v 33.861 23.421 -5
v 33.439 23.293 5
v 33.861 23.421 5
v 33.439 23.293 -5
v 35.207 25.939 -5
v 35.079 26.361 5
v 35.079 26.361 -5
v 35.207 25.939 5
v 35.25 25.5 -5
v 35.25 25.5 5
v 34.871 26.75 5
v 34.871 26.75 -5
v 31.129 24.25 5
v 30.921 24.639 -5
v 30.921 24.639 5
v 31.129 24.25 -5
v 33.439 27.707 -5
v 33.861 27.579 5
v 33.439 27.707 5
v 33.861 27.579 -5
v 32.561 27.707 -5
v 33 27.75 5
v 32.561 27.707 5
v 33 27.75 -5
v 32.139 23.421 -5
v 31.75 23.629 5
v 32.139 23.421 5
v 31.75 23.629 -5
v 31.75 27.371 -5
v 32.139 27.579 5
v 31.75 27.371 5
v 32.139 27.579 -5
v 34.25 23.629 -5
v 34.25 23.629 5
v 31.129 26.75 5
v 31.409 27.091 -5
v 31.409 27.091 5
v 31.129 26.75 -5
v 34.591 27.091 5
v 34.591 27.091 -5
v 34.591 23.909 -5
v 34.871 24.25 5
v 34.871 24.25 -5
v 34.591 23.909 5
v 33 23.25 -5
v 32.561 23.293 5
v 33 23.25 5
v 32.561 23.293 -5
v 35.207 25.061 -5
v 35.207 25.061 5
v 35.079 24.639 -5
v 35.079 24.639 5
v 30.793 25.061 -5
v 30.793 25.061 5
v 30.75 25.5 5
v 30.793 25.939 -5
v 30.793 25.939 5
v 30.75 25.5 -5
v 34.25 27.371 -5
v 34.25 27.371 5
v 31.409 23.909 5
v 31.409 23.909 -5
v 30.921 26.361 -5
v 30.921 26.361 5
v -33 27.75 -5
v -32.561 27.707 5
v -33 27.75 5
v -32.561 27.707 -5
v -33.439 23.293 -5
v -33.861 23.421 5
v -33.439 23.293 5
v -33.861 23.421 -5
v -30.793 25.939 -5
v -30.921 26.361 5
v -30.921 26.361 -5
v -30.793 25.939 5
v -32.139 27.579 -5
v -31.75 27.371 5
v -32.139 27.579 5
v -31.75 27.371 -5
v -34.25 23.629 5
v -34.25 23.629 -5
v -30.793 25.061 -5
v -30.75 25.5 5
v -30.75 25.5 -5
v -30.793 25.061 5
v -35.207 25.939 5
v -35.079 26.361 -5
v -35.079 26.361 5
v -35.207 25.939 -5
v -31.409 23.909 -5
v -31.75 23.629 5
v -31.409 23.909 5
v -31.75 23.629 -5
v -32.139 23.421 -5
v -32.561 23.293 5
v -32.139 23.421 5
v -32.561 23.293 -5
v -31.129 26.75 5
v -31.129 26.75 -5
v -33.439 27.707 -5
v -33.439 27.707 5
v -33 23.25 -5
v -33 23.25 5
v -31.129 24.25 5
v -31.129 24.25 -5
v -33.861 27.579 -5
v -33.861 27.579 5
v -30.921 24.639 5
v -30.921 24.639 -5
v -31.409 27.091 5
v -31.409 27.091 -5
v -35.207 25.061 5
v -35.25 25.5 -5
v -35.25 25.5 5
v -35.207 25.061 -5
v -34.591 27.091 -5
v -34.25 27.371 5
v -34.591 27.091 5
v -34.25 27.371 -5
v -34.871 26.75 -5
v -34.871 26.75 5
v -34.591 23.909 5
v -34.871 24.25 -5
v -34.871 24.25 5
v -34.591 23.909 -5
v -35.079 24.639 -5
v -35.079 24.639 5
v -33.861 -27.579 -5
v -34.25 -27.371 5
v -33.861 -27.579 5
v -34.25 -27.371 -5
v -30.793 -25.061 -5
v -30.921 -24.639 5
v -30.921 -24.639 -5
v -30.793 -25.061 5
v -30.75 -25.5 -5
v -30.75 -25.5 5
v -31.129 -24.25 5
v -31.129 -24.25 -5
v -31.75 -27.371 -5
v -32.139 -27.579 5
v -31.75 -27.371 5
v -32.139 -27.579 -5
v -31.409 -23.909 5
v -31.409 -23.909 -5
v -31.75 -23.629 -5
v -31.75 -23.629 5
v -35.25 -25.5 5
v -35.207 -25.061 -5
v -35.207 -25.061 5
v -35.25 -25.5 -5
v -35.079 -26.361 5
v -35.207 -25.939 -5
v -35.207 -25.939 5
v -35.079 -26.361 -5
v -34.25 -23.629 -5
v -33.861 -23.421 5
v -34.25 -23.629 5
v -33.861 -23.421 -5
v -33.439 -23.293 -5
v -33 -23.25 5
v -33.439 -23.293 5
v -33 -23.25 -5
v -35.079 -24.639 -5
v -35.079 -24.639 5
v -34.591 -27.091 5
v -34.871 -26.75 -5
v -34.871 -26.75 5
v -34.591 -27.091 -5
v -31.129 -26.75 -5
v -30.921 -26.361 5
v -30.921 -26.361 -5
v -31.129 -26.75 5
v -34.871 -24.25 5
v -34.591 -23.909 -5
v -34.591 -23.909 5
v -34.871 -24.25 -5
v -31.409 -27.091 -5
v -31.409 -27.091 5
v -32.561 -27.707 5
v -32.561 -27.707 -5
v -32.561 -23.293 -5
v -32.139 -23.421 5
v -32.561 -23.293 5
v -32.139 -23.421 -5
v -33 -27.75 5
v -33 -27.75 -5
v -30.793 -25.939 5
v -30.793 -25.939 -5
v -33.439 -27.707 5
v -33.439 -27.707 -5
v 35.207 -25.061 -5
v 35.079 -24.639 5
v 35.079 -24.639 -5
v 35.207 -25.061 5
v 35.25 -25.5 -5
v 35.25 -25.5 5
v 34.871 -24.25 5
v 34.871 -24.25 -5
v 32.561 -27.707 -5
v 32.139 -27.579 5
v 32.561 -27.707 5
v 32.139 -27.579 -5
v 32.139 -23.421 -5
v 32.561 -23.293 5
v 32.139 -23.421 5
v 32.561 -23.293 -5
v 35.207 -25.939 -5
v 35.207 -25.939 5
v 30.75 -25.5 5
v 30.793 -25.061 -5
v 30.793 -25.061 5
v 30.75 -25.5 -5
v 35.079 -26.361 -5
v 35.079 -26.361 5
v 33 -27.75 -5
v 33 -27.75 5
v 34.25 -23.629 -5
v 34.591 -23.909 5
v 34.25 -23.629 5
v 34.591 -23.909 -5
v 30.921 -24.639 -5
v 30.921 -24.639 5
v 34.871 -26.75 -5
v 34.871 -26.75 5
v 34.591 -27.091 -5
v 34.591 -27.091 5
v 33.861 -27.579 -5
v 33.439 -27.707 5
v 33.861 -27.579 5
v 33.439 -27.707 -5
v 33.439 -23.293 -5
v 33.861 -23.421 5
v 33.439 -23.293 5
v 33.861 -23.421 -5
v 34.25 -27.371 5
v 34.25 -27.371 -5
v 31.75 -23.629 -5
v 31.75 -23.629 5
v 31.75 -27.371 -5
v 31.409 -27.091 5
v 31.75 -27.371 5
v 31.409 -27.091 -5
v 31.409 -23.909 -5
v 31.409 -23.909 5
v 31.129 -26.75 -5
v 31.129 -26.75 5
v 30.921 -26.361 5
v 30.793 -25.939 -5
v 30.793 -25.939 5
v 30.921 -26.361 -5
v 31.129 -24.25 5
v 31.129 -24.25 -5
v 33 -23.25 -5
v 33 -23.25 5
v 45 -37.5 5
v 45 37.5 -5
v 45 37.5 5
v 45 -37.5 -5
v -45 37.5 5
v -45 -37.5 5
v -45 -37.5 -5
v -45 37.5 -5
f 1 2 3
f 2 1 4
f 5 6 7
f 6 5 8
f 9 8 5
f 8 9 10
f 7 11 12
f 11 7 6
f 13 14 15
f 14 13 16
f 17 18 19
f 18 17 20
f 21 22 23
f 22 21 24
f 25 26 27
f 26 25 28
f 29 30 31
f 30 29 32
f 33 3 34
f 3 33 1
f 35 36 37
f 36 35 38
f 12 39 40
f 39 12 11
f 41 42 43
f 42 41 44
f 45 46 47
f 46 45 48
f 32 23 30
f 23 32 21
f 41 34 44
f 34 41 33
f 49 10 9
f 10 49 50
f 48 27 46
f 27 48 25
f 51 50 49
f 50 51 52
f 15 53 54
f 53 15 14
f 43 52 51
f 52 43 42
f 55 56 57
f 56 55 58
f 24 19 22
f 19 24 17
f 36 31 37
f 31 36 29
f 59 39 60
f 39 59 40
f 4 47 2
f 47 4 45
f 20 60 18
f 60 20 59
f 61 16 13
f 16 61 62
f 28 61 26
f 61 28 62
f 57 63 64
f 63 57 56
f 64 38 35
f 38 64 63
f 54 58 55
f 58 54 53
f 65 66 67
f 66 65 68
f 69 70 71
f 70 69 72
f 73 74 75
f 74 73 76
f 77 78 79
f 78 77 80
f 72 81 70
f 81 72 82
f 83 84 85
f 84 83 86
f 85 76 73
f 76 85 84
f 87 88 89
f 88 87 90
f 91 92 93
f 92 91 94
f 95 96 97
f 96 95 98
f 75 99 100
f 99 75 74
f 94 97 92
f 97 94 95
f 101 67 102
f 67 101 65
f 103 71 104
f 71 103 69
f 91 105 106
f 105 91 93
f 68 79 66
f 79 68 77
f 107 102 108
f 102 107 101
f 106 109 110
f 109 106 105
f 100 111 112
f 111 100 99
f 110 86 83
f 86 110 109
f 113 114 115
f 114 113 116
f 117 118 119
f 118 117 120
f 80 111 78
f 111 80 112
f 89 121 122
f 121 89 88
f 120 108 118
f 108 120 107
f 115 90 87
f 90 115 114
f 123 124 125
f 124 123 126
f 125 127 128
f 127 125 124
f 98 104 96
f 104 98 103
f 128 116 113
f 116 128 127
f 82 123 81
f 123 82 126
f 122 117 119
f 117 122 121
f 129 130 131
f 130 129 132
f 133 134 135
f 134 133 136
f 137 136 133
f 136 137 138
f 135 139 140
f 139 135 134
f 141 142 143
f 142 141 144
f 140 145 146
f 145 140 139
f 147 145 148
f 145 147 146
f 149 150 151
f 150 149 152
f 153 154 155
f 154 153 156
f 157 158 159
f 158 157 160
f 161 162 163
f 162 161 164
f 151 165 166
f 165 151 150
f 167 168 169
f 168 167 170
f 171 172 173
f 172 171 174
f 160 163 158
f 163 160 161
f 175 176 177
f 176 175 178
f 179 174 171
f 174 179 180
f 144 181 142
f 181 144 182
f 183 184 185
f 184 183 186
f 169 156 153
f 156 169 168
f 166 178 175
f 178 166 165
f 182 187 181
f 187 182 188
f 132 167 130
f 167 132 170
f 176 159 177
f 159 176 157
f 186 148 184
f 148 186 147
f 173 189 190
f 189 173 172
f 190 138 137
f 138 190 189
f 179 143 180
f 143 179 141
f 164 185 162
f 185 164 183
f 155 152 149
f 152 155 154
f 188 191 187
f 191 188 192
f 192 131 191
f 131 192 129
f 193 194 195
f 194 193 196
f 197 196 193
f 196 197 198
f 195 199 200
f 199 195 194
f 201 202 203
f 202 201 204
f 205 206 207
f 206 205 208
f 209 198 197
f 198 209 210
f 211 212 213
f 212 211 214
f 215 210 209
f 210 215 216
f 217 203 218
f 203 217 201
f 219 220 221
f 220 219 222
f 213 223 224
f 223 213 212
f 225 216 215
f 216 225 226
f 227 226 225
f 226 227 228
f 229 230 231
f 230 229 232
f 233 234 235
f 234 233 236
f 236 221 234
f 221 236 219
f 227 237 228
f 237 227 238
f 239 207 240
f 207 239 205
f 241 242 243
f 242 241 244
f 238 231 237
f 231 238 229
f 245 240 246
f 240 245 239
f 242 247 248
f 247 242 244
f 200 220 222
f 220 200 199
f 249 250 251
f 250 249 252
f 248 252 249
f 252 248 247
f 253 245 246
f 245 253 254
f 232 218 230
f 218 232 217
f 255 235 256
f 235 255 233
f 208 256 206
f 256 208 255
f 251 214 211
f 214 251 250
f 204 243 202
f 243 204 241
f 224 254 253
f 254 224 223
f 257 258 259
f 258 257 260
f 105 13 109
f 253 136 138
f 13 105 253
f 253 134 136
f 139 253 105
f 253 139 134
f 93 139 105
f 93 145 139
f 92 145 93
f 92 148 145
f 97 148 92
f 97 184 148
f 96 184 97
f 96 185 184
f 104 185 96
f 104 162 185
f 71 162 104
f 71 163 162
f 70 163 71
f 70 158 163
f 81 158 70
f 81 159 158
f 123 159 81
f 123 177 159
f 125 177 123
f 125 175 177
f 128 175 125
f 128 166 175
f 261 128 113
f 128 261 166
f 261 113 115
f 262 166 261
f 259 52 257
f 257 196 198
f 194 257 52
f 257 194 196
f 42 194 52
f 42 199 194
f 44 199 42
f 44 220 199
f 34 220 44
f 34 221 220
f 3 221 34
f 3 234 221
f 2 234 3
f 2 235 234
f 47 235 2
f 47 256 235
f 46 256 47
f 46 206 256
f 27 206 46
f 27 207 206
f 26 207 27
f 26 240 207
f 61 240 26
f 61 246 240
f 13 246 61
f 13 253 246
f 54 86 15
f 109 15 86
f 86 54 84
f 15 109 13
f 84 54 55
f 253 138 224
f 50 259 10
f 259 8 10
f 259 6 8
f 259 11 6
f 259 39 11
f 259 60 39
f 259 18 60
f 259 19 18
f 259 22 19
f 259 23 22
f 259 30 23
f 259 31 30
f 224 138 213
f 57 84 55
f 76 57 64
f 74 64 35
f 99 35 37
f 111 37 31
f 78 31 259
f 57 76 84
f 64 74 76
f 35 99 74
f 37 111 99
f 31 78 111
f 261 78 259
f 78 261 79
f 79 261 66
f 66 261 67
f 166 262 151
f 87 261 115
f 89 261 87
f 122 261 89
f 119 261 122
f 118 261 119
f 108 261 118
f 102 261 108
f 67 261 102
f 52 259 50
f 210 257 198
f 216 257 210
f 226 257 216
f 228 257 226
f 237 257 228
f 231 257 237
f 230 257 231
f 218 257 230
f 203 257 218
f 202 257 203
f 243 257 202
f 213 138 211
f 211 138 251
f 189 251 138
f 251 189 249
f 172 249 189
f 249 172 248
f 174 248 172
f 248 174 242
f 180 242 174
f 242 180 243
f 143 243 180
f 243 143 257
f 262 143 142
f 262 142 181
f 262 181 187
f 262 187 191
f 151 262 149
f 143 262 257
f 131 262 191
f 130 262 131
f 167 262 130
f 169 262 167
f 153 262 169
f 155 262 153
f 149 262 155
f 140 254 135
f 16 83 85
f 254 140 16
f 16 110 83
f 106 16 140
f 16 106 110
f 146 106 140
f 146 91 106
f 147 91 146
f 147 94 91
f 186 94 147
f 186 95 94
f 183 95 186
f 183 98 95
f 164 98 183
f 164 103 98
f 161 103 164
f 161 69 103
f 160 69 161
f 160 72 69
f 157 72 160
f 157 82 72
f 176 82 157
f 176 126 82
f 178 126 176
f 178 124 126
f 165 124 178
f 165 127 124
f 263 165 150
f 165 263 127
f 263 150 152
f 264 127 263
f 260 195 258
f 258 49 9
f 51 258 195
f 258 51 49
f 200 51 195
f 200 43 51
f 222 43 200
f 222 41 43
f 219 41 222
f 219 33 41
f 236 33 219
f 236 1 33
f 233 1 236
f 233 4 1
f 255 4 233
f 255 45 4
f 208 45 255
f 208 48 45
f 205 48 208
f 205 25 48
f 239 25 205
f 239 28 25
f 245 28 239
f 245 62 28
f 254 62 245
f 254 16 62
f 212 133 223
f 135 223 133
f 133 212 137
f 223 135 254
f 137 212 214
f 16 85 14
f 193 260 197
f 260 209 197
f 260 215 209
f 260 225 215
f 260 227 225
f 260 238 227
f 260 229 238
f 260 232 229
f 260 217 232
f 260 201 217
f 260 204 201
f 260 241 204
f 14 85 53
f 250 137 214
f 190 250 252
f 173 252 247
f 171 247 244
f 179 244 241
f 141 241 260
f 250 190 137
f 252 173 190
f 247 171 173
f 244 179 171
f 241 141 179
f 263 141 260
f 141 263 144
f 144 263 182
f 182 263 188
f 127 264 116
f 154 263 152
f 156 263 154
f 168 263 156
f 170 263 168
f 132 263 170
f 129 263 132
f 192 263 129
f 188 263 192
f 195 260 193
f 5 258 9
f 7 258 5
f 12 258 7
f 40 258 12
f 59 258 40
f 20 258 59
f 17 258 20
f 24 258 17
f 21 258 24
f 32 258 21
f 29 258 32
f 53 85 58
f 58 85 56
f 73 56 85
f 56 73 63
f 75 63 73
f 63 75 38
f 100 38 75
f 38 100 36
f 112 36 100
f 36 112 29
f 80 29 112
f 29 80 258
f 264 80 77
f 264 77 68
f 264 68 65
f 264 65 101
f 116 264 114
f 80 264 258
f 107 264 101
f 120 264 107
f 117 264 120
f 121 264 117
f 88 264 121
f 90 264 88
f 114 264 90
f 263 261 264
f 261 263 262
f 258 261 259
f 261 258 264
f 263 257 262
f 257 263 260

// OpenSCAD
$fn = 32;

// ----------------------------------------------------------------------
// Corner plate 90 x 75 x 10
// 4 holes, centres taken from the edge offset
// ----------------------------------------------------------------------

// --- parameters (mm) ---
plate = [90, 75, 10];  // overall size (x, y, z)
holes = 4;             // number of holes the drawing asks for
hole_d = 4.5;          // hole diameter
edge = 12;             // hole centre offset from the plate edge

// --- derived feature positions (mm) ---
corner_x = plate[0] / 2 - edge;  // = 33   corner hole X
corner_y = plate[1] / 2 - edge;  // = 25.5   corner hole Y
feature_centers = [
  [corner_x, corner_y],
  [-corner_x, corner_y],
  [-corner_x, -corner_y],
  [corner_x, -corner_y]
];   // hole centres the loop below drills

// plate outline, every hole drilled through with the same cutters
difference() {
  cube(plate, center = true);
  for (centre = feature_centers)
    translate([centre[0], centre[1], 0])
      cylinder(d = hole_d, h = plate[2] + 2, center = true);
}
